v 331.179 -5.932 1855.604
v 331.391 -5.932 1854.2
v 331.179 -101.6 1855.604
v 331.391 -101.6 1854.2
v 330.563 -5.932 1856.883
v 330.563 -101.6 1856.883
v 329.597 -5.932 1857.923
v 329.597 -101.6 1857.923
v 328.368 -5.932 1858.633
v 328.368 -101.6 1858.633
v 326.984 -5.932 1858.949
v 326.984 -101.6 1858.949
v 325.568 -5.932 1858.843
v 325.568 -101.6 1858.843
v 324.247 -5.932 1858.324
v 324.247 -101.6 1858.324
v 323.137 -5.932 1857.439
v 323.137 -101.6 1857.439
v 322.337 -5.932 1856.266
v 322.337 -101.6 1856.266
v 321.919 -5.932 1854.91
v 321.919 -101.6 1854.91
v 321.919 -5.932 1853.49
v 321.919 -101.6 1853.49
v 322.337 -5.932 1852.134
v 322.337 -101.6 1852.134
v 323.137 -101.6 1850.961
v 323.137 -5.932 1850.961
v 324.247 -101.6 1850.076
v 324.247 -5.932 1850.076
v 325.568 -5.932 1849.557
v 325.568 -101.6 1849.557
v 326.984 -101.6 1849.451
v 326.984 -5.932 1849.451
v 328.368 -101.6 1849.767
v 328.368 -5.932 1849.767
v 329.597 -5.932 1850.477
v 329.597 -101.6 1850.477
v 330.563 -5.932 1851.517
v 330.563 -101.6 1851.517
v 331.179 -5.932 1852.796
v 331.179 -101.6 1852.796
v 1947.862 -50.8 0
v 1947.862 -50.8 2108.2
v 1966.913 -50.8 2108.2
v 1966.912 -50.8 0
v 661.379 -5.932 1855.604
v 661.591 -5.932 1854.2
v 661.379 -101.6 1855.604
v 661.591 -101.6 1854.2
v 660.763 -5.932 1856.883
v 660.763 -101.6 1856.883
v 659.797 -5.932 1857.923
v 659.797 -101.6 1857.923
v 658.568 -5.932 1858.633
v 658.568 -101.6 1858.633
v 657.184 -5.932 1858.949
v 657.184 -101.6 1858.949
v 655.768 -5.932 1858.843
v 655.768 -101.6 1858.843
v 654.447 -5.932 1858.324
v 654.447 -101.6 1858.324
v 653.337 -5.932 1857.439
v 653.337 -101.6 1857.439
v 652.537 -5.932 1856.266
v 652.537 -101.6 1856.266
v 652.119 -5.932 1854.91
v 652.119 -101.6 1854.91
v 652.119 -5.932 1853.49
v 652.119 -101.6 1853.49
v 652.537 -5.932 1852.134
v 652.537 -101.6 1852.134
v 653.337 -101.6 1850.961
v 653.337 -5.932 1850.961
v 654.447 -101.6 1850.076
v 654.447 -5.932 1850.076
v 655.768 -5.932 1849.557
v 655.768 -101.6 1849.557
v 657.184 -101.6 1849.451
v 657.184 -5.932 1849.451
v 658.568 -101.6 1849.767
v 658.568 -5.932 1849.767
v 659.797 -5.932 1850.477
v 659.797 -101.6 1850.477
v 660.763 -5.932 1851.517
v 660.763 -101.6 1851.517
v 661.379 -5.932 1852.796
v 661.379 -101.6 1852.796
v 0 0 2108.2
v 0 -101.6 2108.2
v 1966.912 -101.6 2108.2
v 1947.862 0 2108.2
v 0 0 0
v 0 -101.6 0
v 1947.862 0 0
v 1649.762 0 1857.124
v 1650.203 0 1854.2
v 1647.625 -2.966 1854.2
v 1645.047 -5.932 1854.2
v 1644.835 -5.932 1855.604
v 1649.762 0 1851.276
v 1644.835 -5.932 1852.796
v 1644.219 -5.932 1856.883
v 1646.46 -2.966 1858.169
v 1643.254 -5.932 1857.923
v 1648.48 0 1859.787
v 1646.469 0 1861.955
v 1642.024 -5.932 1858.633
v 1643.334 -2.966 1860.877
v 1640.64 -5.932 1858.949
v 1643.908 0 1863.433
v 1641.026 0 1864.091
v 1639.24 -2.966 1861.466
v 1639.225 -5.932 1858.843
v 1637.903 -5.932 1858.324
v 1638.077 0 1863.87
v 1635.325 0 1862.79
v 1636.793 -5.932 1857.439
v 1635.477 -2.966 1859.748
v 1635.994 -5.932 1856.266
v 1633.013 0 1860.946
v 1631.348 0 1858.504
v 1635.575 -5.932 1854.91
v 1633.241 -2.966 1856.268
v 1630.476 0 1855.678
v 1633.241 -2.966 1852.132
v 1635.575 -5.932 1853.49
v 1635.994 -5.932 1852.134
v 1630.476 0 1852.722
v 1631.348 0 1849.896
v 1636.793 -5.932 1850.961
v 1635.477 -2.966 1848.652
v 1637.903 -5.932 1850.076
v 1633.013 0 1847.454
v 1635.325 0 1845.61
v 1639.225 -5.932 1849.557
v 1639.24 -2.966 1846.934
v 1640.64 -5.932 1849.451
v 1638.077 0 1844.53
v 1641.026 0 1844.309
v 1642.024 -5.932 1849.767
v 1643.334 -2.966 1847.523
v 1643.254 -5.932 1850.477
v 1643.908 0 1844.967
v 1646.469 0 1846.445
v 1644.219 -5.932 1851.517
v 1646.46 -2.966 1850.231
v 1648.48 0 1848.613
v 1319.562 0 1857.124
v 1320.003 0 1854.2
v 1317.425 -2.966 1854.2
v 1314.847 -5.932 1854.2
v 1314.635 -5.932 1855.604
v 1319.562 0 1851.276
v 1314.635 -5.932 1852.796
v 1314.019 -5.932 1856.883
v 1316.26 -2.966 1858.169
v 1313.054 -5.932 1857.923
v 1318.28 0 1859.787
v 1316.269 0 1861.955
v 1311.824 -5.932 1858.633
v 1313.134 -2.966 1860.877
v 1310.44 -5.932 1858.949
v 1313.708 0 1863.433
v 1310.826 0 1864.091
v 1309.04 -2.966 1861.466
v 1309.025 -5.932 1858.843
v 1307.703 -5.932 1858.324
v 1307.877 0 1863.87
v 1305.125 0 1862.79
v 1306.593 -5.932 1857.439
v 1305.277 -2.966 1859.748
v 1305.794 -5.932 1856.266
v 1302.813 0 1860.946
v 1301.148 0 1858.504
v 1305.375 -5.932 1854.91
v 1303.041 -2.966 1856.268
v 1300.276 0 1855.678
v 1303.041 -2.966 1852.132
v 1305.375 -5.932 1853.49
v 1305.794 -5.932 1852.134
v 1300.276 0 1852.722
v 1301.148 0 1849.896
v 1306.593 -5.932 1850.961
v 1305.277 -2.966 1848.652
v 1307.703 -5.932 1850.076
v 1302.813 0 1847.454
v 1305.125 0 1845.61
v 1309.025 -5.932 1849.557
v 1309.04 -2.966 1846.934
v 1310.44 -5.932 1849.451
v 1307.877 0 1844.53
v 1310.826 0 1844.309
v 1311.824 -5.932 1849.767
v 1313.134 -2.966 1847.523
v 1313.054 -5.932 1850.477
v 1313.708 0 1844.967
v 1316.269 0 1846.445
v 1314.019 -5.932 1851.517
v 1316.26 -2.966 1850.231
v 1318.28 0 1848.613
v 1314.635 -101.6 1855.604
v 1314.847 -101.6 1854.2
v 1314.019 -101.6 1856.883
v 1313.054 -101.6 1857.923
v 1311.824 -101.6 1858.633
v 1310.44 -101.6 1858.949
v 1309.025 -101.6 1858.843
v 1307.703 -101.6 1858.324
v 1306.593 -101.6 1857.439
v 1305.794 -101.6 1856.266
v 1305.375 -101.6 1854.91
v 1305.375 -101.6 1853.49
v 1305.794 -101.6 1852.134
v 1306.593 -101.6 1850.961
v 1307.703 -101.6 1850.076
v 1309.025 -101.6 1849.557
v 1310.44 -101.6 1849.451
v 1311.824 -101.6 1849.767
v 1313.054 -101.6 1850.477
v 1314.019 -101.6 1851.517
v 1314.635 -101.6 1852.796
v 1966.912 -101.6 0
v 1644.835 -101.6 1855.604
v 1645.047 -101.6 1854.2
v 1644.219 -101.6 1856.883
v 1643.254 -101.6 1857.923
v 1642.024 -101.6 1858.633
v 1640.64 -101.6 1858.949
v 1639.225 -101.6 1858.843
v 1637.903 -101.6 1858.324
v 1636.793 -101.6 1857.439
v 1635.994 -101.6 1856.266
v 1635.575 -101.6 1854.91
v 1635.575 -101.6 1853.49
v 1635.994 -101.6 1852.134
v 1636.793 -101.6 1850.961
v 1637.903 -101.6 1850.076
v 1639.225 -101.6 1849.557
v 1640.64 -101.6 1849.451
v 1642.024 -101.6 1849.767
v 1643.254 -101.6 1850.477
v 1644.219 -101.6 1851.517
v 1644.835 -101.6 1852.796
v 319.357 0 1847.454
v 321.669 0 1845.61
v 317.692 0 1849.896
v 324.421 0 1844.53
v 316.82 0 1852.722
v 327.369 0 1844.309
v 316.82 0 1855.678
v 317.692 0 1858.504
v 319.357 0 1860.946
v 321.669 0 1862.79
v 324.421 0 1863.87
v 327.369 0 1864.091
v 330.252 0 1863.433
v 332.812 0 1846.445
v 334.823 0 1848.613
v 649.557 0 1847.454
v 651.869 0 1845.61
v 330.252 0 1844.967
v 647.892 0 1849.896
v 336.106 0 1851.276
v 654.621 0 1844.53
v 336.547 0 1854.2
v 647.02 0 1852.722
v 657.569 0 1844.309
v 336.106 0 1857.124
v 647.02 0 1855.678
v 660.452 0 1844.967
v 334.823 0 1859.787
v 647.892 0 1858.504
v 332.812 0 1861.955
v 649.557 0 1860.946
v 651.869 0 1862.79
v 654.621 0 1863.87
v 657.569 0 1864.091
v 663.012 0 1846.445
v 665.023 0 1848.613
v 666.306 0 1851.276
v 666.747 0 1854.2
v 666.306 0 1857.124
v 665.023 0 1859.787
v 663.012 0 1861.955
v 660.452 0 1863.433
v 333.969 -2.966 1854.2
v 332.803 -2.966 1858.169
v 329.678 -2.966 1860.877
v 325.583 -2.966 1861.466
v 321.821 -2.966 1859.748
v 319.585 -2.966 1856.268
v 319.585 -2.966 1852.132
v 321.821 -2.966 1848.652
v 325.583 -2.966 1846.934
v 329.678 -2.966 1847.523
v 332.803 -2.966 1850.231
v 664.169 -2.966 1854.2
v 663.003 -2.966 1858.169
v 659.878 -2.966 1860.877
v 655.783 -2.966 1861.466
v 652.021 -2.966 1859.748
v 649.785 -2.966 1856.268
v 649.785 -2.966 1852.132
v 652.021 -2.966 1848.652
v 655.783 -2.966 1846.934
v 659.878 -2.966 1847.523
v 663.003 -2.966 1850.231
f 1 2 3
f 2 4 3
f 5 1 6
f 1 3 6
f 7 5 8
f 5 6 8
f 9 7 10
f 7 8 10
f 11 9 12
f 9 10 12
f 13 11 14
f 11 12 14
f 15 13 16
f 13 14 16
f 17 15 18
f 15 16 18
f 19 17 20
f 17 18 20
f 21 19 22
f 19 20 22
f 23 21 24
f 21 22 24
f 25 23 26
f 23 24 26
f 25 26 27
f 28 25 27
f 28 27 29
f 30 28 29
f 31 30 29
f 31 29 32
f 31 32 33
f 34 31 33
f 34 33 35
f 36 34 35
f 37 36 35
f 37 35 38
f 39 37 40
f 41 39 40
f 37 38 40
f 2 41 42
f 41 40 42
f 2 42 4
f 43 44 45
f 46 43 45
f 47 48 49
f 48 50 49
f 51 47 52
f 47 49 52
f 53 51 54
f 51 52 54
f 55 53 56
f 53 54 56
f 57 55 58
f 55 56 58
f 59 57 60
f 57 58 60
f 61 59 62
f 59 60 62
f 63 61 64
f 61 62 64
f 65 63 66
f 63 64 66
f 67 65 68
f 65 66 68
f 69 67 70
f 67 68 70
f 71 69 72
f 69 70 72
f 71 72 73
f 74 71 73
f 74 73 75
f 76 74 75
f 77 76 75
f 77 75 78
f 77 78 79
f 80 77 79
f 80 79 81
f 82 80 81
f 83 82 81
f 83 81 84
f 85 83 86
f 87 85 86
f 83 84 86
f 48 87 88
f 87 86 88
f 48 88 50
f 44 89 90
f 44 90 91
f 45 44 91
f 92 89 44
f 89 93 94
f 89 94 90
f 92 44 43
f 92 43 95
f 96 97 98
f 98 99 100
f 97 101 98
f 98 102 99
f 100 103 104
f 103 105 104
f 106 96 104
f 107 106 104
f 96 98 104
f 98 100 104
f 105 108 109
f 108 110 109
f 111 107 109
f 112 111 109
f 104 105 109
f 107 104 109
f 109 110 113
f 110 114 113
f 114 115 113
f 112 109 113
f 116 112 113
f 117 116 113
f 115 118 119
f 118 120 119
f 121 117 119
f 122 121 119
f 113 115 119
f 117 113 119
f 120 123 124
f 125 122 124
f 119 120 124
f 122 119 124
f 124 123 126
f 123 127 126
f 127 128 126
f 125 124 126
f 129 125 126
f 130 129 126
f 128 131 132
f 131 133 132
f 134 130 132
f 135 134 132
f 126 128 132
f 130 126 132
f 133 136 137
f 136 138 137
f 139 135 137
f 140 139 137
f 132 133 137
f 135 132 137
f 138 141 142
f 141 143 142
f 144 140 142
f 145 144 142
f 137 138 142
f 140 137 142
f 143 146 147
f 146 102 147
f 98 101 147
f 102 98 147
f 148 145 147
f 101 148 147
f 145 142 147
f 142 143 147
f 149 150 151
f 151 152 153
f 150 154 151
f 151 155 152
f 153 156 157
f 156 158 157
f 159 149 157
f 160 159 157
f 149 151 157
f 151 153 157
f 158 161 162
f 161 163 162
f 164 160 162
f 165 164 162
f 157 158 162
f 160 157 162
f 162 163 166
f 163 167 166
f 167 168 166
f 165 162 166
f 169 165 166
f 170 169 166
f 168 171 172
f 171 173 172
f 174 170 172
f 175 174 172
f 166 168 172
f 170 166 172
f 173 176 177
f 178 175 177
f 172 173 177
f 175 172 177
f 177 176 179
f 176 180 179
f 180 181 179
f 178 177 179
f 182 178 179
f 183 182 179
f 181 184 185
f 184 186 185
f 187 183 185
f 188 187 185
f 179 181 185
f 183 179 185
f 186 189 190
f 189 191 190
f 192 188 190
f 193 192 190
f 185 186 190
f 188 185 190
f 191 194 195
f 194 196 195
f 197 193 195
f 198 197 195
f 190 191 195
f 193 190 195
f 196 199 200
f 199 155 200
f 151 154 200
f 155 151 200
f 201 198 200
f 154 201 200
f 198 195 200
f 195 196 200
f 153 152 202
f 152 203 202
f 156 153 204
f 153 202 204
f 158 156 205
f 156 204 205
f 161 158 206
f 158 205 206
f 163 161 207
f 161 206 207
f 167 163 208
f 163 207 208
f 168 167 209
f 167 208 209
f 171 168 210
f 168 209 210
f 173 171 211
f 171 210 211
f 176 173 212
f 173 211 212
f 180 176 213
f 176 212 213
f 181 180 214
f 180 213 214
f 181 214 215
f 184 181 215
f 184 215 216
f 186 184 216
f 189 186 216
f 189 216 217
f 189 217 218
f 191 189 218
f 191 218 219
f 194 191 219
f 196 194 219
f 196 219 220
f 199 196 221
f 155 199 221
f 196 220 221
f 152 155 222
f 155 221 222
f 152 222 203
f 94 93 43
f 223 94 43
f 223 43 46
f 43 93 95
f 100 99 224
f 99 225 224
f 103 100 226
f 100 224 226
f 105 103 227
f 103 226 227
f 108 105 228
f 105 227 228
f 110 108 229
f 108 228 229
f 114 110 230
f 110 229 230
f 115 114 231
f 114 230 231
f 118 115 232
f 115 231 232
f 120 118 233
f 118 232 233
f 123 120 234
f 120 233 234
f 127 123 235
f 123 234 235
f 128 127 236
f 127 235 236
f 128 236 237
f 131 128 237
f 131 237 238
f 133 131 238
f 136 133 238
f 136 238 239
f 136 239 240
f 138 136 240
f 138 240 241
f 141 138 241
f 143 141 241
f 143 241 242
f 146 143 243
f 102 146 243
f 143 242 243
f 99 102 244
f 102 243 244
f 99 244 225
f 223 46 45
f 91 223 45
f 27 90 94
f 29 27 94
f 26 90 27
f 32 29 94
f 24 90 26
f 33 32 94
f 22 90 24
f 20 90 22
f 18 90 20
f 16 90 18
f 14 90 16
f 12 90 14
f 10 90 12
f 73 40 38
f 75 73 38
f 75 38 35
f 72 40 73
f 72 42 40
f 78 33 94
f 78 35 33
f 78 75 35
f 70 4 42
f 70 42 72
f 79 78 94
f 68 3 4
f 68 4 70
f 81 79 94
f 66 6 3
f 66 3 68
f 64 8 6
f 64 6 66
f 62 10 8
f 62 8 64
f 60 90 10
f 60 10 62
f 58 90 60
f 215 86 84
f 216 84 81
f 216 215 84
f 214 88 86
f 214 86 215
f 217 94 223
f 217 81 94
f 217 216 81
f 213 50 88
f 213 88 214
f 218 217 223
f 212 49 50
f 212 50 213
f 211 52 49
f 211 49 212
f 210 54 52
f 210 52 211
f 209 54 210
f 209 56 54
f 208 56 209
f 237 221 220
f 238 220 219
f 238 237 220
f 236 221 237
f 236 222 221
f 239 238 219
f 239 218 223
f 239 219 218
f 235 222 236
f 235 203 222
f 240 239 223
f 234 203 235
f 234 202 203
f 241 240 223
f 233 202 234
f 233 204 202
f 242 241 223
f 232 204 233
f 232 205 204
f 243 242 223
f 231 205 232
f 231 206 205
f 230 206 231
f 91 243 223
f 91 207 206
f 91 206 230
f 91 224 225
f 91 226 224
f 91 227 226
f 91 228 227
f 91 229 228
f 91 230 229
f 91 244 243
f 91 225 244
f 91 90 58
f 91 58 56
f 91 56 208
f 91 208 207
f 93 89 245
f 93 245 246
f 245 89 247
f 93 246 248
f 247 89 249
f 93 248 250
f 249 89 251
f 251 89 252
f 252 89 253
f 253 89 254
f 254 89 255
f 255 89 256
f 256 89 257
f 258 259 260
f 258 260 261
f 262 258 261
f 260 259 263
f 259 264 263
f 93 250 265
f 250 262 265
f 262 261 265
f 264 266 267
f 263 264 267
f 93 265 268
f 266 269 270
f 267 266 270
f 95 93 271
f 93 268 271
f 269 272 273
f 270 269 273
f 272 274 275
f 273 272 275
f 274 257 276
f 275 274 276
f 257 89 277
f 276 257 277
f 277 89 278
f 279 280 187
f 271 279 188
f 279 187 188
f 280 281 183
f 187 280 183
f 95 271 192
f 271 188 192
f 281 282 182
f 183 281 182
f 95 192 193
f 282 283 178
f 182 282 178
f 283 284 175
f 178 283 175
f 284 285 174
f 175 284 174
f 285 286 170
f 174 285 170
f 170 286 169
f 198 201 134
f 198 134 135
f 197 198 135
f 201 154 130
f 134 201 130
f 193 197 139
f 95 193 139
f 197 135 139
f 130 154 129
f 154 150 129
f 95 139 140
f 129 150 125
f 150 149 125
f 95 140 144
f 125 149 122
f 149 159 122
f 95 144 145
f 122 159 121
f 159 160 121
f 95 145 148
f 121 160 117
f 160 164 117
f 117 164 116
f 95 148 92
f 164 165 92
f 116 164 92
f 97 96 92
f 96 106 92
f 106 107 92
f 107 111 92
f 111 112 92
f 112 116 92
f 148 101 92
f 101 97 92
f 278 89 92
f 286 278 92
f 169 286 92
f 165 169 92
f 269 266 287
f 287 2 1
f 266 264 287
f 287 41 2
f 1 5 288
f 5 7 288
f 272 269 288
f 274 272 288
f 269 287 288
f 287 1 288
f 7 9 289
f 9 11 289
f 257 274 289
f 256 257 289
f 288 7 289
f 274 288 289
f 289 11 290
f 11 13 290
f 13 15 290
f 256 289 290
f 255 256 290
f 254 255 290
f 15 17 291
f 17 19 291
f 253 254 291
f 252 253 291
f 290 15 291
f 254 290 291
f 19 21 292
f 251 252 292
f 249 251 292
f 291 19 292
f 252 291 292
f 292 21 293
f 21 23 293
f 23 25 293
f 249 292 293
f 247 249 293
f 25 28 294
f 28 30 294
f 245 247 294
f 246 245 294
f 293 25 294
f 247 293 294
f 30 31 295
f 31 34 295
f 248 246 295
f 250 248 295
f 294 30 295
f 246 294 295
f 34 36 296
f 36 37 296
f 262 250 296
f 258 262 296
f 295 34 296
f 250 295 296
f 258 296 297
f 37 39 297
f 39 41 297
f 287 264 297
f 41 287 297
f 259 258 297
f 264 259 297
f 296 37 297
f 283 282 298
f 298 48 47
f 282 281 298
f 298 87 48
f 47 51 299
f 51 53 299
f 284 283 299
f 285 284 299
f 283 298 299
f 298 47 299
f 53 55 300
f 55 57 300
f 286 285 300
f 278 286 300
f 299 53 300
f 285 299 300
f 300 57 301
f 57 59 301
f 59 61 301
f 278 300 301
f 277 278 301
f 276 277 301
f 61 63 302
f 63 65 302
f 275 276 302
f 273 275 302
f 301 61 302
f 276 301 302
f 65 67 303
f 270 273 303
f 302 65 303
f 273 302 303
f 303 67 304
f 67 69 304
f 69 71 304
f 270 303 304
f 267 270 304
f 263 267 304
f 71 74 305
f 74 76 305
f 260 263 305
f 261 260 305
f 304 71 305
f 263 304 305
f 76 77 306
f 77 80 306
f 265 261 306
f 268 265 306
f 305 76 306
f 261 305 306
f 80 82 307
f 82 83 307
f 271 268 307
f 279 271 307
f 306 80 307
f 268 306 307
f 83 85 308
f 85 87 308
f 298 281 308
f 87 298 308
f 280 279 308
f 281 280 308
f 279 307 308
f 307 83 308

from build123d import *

# Parameters (mm, degrees)
F0_W           = 1966.9125
F0_H           = 2108.2
F1_DEPTH       = 101.6
F2_W           = 19.05
F2_H           = 50.8
F3_DEPTH       = 2108.201
F6_D           = 9.525
F6_CSINK_D     = 19.8374
F6_CSINK_ANGLE = 82


# Not quite as in the source:
# - a feature names something its author has since deleted; it is built from what else it names


with BuildPart() as f1:
    # F0 (on Front) → F1 (new body)
    with BuildSketch(Plane.XZ):
        with Locations((983.45625, 1054.1)):
            Rectangle(F0_W, F0_H)
    extrude(amount=F1_DEPTH)

    # F2 (on face) → F3 (cut, through all)
    with BuildSketch(Plane.XY.offset(2108.2)):
        with Locations((1957.3875, -25.4)):
            Rectangle(F2_W, F2_H)
    extrude(amount=-F3_DEPTH, mode=Mode.SUBTRACT)

    # F6 (through all)
    with Locations(Plane(origin=(0, 0, 0), x_dir=(-1, 0, 0), z_dir=(0, 1, 0))):
        with Locations((-1640.284375, 1854.2), (-1310.084375, 1854.2), (-656.828125, 1854.2), (-326.628125, 1854.2)):
            CounterSinkHole(F6_D / 2, F6_CSINK_D / 2, counter_sink_angle=F6_CSINK_ANGLE)


solid = f1.part
